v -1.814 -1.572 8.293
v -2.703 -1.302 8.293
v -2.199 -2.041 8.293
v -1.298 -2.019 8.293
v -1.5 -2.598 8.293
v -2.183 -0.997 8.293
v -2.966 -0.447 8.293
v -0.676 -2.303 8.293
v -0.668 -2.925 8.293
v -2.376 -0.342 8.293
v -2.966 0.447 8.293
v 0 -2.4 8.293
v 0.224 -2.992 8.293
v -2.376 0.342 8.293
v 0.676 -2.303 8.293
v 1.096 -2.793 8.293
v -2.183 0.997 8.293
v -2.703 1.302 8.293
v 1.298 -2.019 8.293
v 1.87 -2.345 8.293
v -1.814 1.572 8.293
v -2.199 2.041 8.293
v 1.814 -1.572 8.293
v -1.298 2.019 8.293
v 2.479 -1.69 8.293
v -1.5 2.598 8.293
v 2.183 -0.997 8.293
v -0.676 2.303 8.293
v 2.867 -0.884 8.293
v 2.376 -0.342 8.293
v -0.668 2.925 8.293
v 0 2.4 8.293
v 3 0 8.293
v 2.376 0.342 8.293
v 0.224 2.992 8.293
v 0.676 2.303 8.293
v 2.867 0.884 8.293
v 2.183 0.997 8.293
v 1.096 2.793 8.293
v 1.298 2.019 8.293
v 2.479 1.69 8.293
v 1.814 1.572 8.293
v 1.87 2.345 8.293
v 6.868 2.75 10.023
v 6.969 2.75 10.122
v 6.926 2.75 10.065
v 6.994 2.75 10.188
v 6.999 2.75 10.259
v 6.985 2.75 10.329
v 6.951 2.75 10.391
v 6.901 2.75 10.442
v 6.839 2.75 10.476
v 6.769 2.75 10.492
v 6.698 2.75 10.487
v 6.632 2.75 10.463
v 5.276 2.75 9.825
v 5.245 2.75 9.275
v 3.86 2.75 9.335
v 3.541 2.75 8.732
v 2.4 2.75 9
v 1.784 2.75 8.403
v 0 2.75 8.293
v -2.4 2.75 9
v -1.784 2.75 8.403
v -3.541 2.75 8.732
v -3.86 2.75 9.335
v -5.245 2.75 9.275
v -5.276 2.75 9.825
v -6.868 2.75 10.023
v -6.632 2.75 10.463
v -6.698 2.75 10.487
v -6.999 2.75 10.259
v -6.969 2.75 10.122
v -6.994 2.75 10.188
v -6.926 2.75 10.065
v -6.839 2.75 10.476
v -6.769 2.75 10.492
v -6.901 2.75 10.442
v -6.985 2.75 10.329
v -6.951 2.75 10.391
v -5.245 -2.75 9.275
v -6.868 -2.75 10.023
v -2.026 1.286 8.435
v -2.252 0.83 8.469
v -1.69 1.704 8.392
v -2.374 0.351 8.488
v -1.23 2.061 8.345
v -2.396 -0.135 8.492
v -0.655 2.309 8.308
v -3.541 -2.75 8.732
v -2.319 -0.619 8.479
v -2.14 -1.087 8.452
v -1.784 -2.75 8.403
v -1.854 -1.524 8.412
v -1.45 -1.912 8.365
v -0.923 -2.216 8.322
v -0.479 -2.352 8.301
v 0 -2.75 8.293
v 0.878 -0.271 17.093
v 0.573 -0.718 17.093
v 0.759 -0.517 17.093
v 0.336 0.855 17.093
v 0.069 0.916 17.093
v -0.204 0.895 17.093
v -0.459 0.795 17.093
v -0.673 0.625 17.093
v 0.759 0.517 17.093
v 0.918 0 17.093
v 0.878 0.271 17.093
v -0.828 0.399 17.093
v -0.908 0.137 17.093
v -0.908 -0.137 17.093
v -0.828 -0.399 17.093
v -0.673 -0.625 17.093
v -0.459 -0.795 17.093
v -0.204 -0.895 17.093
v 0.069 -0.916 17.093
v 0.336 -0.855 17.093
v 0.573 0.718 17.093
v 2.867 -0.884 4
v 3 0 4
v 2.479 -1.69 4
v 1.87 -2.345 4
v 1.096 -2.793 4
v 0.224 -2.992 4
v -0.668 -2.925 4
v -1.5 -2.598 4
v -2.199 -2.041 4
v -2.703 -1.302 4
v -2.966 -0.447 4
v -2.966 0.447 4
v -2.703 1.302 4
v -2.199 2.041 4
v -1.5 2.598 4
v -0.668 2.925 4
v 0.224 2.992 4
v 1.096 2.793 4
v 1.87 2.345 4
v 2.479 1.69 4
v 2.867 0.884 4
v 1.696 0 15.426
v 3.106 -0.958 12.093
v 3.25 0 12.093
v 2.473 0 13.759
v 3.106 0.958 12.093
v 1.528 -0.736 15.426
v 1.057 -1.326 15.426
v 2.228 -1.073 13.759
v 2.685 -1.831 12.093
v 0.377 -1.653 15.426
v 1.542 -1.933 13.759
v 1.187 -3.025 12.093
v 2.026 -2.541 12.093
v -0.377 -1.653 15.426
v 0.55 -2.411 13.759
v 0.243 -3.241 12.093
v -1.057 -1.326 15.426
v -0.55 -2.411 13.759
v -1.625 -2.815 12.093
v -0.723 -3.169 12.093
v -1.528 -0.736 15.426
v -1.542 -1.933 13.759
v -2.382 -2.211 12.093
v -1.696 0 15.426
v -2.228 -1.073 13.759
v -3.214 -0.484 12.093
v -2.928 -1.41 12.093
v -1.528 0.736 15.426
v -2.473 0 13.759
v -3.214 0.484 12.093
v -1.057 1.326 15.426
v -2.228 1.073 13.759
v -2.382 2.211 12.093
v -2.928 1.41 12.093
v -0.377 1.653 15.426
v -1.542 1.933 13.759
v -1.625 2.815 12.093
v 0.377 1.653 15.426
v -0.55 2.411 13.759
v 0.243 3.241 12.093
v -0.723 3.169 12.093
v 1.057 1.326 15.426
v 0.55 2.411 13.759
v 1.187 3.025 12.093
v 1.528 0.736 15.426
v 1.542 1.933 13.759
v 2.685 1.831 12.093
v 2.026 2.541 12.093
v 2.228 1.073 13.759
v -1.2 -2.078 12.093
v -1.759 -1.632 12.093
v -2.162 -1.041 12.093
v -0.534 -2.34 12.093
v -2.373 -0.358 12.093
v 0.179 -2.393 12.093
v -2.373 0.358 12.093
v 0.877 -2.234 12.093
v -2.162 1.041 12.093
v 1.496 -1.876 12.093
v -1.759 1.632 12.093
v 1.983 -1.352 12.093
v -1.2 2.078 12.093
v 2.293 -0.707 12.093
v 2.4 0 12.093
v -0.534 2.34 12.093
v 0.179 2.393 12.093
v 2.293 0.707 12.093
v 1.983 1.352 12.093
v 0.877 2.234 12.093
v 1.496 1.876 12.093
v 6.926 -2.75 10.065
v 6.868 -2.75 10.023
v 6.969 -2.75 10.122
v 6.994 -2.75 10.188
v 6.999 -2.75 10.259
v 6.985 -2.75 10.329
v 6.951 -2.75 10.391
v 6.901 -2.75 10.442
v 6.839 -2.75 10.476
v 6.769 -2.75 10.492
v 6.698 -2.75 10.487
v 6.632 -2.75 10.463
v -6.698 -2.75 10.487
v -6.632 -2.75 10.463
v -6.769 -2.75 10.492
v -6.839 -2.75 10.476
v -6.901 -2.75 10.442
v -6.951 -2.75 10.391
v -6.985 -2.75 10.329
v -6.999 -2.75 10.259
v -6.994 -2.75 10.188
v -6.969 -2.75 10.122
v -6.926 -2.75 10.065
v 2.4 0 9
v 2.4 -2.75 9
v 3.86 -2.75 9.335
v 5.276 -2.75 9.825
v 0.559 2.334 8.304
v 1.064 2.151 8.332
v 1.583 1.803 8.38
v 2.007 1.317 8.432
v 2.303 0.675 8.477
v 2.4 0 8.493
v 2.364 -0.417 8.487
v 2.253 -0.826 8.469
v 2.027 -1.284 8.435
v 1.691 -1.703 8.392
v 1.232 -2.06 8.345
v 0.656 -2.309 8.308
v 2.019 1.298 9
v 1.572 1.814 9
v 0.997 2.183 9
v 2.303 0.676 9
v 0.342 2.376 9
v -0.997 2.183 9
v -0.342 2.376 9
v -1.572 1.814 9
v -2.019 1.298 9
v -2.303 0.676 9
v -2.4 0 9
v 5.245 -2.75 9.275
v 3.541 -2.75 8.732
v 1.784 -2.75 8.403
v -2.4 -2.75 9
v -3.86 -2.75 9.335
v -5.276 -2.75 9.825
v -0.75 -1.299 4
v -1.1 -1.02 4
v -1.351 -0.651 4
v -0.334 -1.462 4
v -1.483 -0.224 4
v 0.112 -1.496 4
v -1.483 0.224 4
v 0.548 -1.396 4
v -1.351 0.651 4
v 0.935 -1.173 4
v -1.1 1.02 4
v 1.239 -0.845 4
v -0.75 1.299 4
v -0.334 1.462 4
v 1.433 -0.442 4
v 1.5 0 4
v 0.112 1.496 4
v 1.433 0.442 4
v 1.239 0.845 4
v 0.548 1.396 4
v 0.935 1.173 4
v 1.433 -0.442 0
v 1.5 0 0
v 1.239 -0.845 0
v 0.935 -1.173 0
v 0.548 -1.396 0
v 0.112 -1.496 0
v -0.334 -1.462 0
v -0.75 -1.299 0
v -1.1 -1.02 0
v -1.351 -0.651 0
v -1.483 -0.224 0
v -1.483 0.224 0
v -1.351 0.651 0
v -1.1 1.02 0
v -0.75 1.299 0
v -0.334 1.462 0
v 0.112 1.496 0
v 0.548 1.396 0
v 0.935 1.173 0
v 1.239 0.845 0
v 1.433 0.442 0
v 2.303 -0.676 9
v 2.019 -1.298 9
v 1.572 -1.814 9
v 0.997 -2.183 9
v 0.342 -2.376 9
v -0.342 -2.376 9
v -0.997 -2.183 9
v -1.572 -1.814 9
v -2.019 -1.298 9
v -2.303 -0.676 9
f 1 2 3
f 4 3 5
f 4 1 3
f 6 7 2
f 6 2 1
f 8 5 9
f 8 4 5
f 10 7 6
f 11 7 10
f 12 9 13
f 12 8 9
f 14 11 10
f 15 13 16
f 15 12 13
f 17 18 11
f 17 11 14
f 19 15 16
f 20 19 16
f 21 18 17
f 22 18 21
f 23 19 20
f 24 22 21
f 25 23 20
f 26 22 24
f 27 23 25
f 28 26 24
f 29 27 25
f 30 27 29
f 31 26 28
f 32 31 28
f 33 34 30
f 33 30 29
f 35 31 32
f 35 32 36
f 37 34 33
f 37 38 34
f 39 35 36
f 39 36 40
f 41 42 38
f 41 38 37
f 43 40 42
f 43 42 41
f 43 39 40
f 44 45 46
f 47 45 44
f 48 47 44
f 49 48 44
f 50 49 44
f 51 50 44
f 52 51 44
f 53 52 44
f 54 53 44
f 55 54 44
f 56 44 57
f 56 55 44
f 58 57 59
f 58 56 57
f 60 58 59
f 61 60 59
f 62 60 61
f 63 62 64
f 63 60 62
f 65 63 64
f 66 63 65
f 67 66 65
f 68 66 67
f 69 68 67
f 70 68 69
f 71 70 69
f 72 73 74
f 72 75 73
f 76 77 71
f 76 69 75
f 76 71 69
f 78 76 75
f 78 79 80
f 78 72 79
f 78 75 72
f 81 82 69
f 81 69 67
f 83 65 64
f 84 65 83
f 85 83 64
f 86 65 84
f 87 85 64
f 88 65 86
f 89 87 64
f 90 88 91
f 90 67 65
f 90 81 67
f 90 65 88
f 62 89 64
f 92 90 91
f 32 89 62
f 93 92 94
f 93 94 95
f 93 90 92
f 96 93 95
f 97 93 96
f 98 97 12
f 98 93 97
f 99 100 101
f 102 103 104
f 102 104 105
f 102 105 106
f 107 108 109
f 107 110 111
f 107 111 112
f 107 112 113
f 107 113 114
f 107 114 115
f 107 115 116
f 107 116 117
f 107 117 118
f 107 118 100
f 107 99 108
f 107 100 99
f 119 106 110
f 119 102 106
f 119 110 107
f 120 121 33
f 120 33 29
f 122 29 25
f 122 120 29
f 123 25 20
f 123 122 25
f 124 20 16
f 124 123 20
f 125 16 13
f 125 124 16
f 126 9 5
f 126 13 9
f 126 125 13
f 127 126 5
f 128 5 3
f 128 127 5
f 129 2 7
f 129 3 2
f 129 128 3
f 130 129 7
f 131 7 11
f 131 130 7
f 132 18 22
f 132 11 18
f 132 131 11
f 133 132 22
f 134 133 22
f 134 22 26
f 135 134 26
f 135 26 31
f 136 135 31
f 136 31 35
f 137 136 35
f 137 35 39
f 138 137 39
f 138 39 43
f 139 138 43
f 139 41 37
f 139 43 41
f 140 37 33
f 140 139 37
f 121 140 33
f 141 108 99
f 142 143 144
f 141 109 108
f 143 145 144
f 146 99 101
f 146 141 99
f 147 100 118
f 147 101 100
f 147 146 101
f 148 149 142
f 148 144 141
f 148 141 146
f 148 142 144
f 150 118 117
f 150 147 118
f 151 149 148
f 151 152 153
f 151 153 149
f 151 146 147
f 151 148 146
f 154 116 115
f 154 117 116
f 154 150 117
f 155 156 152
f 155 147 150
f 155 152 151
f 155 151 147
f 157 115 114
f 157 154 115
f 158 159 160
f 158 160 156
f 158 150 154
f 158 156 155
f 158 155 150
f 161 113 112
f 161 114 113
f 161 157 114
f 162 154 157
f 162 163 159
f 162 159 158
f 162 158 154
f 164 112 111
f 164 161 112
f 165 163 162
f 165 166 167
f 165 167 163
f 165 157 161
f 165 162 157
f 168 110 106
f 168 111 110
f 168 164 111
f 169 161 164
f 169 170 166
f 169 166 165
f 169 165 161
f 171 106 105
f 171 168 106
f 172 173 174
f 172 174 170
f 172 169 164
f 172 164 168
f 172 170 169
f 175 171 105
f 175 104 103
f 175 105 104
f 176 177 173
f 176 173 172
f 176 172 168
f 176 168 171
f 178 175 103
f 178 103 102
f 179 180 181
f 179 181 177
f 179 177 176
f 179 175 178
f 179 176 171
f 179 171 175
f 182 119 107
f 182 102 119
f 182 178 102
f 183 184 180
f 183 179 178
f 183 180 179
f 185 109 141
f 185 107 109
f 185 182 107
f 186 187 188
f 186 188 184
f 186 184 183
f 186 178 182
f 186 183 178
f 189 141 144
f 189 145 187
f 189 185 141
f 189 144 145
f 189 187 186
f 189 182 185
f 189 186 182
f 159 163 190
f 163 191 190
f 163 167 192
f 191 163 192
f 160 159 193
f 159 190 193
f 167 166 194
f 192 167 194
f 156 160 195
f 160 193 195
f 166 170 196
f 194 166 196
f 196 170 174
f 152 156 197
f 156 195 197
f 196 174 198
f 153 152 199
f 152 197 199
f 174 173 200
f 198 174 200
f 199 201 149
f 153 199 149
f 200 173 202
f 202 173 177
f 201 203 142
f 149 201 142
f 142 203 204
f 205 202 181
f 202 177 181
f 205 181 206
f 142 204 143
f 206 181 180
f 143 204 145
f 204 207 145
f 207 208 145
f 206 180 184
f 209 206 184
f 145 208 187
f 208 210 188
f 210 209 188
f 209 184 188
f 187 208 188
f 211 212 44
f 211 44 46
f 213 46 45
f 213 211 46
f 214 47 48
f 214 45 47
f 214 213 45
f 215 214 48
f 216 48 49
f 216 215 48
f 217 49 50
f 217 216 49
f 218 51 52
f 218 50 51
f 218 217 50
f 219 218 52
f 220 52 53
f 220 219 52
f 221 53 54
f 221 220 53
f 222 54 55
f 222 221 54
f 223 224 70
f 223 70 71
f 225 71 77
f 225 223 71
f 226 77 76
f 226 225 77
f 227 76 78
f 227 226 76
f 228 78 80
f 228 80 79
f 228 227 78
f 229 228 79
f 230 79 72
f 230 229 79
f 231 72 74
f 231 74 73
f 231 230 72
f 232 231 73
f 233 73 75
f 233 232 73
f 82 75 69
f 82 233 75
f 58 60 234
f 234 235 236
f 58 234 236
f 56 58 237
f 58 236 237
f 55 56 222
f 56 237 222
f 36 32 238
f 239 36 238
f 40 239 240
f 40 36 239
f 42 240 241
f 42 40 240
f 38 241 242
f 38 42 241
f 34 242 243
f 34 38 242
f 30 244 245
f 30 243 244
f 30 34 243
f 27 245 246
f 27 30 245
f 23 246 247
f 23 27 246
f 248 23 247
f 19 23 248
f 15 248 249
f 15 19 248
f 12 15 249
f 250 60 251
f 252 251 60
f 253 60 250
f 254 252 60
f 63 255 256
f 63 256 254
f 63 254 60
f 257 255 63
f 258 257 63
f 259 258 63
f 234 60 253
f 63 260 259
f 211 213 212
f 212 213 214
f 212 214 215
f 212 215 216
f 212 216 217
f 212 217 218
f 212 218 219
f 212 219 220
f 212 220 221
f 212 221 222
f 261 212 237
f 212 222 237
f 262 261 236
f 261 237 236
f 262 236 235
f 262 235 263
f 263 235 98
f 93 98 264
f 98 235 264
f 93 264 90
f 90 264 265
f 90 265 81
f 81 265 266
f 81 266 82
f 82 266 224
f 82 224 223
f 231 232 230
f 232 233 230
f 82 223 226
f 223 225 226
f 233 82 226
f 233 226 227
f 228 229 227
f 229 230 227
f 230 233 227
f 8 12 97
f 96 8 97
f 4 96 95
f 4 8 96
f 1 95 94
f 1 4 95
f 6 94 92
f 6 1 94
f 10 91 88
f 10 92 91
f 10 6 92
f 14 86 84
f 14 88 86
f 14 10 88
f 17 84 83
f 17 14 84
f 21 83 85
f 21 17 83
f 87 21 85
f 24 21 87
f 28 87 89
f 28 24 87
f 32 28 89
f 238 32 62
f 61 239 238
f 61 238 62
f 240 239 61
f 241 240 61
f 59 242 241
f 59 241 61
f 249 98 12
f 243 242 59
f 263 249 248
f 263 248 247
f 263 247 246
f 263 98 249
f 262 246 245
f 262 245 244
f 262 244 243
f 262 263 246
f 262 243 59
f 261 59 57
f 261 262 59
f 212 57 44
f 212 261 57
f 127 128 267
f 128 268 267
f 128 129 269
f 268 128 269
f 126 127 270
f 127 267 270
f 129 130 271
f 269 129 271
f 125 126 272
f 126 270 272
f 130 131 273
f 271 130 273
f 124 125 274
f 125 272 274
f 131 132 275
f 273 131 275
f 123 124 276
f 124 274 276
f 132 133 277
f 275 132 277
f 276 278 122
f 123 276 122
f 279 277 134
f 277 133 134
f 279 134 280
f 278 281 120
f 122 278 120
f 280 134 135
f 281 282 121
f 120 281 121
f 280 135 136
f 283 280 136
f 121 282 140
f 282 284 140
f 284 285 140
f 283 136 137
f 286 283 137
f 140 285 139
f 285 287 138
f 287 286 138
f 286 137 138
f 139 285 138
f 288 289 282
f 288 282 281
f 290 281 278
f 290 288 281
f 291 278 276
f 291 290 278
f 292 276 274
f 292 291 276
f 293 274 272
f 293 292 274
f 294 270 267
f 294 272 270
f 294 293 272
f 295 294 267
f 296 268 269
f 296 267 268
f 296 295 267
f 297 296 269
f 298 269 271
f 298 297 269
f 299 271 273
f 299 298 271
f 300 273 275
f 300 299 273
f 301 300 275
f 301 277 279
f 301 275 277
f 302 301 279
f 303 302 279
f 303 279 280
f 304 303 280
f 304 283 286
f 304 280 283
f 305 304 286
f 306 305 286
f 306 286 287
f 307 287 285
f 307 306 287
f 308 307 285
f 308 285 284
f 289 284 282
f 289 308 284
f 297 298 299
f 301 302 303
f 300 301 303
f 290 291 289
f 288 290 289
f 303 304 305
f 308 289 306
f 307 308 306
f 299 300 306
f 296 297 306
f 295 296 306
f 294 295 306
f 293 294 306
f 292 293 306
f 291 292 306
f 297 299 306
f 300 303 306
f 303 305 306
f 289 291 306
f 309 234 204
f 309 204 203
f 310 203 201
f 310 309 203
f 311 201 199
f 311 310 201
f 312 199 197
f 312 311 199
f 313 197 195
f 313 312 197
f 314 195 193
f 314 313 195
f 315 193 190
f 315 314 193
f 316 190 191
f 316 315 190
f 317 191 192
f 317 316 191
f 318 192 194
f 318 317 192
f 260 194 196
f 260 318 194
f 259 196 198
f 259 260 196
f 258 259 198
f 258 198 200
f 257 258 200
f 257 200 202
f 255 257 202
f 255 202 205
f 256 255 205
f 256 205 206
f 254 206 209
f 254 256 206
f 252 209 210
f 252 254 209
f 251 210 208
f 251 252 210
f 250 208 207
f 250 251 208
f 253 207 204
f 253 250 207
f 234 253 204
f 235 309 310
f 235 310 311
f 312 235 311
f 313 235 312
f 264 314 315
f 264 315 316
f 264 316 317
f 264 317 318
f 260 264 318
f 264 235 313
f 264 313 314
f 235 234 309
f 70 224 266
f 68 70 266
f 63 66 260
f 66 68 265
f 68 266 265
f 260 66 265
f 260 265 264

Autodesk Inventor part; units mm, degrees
ref_plane "YZ Plane" through (0, 0, 0) normal (1, 0, 0) x (0, 1, 0)
ref_plane "XZ Plane" through (0, 0, 0) normal (0, 1, 0) x (-1, 0, 0)
ref_plane "XY Plane" through (0, 0, 0) normal (0, 0, 1) x (1, 0, 0)
sketch "Sketch1" plane through (0, 0, 0) normal (0, 1, 0) x (-1, 0, 0)
  line L0 (0, 0) -> (0, 17.0928)
  line L1 (0, 17.0928) -> (-0.9185, 17.0928)
  line L2 (-0.9185, 17.0928) -> (-3.25, 12.0928)
  line L3 (-3.25, 12.0928) -> (-2.4, 12.0928)
  line L4 (-2.4, 12.0928) -> (-2.4, 8.2928)
  line L5 (-2.4, 8.2928) -> (-3, 8.2928)
  line L6 (-3, 8.2928) -> (-3, 4)
  line L7 (-3, 4) -> (-1.5, 4)
  line L8 (-1.5, 4) -> (-1.5, 0)
  line L9 (-1.5, 0) -> (0, 0)
  arc A0 (-6.8684, 10.0226) -> (0, 8.2928) centre (0, 22.7935) ccw
  arc A1 (-6.6316, 10.4629) -> (-2.4, 9) centre (0, 22.7935) ccw
  arc A2 (-6.6316, 10.4629) -> (-6.8684, 10.0226) centre (-6.75, 10.2428) ccw
  line L10 (-2.4, 9) -> (0, 9)
  point P0 (0, 10)
  dimension "d0" = 3
  dimension "d1" = 4
  dimension "d3" = 6
  dimension "d4" = 5
  dimension "d5" = 6.5
  dimension "d9" = 8.8
  dimension "d10" = 25
  dimension "d11" = 4.8
  dimension "d15" = 5
  dimension "d17" = 14
  dimension "d18" = 0.5
  dimension "d19" = 1.6
revolve "Revolution1" add sketch "Sketch1" angle 360 about axis through (0, 0, 0) along (0, 0, 1) contours L9 L8 L7 L6 L5 L4 A0 L0 | A0 L4 L10 L0 | L10 L4 L3 L2 L1 L0
extrude "Extrusion1" add sketch "Sketch1" along normal mid plane 5.5 contours A0 L4 L10 L0 | A0 A2 A1 L4
mirror "Mirror1" about plane through (0, 0, 8.2928) normal (-1, 0, 0) of "Extrusion1"
properties part number "WBN-305" material "Acetal Resin, White"
